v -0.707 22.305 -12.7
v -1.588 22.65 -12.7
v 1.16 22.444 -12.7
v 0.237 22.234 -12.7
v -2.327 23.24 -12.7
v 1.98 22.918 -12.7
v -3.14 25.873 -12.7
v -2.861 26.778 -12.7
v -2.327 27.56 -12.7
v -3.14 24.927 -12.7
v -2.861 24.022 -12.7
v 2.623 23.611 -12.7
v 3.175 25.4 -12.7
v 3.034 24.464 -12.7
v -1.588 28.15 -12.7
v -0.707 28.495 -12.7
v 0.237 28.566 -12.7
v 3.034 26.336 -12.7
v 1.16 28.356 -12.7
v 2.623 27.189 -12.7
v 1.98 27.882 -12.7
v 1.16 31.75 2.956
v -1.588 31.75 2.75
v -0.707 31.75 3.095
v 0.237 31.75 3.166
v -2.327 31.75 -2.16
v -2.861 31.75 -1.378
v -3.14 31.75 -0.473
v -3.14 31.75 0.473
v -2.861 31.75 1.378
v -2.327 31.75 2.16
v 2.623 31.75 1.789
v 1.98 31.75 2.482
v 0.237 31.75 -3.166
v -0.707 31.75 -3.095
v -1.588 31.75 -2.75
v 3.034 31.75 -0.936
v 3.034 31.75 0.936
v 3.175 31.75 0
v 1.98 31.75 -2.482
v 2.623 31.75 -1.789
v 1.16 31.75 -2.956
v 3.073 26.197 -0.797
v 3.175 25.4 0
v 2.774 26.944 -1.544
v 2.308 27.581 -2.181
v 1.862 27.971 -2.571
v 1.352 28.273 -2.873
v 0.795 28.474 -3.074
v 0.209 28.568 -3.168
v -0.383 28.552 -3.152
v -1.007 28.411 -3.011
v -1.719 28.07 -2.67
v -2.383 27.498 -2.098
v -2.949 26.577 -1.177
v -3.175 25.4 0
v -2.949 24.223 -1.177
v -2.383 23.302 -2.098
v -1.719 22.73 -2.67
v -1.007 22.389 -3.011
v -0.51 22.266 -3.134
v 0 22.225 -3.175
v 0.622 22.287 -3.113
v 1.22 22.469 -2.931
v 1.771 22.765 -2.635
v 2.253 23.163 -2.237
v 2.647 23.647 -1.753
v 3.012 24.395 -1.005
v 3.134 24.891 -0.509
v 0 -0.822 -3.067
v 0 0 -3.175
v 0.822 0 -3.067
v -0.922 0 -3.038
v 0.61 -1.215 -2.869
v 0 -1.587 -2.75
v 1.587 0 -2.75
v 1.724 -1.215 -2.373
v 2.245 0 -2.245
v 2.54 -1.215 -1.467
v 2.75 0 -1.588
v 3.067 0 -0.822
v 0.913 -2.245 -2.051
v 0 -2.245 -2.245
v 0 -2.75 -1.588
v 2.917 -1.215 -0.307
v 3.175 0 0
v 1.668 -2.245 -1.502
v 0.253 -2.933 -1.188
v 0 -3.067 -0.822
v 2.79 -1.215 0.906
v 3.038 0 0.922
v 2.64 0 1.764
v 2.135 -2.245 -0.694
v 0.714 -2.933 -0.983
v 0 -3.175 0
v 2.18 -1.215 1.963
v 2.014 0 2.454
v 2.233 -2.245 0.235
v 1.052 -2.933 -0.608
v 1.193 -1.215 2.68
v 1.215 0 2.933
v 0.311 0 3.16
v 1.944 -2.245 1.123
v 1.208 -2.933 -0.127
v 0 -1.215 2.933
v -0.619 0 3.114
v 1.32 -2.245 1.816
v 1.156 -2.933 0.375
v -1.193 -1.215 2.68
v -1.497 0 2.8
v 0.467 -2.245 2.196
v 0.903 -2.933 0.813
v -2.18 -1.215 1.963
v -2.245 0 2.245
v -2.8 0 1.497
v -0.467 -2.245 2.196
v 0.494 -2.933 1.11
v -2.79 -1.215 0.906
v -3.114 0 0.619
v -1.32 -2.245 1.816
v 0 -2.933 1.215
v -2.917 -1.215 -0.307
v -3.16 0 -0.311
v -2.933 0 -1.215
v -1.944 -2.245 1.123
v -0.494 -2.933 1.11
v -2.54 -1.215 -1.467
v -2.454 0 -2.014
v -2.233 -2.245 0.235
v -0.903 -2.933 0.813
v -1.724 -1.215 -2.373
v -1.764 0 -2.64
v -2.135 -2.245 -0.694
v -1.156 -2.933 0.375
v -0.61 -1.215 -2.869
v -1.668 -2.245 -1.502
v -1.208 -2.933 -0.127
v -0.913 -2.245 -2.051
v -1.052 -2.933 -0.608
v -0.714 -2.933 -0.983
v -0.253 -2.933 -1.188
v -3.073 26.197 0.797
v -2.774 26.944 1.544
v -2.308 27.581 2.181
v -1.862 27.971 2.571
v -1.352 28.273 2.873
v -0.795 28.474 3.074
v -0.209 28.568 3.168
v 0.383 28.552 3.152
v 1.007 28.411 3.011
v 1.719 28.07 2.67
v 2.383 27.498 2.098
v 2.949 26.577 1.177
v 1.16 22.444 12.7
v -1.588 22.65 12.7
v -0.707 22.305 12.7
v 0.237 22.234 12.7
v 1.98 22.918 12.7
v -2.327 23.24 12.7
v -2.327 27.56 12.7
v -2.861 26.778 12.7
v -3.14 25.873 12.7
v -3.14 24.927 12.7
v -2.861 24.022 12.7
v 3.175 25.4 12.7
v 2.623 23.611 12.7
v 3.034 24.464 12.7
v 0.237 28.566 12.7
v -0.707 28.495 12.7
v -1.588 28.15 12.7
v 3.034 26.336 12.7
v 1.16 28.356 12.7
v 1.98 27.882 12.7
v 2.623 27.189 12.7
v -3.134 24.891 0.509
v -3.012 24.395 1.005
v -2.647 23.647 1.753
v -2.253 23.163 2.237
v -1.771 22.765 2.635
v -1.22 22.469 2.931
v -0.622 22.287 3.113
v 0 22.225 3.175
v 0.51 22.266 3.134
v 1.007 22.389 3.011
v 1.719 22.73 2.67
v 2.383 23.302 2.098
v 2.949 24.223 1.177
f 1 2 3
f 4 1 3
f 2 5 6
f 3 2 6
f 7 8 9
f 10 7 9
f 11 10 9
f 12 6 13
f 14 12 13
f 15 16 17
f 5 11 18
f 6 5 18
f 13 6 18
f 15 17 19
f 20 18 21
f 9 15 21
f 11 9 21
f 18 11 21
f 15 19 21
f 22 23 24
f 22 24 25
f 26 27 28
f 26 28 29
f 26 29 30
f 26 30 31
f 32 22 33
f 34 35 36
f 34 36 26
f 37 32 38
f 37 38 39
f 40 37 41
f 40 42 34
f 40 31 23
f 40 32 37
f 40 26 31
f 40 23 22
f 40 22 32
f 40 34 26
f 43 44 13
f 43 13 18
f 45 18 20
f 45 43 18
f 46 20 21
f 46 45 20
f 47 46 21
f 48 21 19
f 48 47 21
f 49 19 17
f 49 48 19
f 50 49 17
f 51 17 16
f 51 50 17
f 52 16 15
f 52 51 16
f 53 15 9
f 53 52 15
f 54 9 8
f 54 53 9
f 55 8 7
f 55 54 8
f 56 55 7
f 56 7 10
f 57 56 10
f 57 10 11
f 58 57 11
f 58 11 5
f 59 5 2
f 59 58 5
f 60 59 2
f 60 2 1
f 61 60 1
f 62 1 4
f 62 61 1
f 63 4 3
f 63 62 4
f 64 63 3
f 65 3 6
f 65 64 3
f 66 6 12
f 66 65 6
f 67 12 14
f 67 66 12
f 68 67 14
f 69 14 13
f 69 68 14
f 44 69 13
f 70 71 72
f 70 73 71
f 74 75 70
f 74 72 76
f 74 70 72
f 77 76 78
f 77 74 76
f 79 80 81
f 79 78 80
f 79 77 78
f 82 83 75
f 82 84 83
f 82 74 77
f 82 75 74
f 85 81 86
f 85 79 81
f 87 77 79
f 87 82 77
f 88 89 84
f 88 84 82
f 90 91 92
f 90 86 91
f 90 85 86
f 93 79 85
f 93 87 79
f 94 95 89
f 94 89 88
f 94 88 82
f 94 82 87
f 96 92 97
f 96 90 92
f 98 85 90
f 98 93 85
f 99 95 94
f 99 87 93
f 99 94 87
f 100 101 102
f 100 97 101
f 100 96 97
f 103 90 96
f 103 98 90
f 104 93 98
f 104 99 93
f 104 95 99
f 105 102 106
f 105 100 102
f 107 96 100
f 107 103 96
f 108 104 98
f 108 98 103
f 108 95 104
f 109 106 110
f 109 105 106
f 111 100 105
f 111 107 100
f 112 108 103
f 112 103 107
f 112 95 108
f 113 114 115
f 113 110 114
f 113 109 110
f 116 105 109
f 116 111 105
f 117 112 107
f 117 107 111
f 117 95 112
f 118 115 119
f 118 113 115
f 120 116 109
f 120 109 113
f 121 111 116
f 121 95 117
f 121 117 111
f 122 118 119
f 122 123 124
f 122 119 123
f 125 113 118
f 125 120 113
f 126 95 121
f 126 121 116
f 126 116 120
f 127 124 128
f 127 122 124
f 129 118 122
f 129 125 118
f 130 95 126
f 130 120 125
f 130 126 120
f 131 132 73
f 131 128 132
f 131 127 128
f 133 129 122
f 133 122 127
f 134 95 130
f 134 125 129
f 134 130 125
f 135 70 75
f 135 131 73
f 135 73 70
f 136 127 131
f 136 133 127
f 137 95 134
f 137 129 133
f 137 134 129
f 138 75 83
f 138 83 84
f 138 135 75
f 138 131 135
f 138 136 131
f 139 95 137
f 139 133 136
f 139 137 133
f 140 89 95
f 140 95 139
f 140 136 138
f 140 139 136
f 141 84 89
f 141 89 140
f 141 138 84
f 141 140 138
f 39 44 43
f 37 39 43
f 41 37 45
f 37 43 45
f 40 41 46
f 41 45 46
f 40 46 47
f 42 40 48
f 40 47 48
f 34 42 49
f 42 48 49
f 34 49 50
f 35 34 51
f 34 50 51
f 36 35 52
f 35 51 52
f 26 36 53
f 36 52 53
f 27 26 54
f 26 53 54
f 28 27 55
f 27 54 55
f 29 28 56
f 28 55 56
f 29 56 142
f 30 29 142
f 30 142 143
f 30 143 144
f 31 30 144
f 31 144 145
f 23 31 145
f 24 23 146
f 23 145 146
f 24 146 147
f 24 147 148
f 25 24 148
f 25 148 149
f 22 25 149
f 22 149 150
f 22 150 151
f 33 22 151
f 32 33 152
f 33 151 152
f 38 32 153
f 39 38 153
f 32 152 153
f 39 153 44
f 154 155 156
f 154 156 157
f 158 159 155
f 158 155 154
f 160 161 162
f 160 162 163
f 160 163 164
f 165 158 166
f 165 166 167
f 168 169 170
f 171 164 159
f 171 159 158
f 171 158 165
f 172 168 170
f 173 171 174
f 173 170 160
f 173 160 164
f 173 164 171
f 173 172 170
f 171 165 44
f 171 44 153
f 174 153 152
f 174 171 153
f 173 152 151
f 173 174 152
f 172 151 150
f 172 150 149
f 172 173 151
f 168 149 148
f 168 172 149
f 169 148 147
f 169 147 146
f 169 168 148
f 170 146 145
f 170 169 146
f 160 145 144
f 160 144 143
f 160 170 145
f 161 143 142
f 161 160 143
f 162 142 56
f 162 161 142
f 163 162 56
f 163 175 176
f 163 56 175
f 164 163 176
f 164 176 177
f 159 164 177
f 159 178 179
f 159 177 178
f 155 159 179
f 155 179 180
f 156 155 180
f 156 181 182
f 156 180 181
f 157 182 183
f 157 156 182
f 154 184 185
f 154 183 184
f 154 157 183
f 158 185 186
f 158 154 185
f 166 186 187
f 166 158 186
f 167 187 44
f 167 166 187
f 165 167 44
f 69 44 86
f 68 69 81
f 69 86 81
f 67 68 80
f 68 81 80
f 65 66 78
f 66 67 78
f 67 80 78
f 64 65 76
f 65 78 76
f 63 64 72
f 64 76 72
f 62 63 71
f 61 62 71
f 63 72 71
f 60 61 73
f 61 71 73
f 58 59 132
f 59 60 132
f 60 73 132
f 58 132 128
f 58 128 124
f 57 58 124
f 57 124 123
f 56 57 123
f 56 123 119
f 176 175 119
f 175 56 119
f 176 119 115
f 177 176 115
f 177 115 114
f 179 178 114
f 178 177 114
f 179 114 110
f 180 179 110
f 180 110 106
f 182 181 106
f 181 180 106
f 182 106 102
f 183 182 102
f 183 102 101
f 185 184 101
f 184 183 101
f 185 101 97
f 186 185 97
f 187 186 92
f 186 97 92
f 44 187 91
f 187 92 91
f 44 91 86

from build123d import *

# Parameters (mm, degrees)
SKETCH1_R           = 3.175
BOSS_EXTRUDE1_DEPTH = 31.75
SKETCH2_R           = 3.175
BOSS_EXTRUDE2_DEPTH = 12.7
DOME2_FACE_RADIUS   = 3.175
DOME2_HEIGHT        = 3.175


with BuildPart() as part:
    # Sketch1 → Boss-Extrude1 (new body)
    with BuildSketch(Plane(origin=(0, 0, 0), x_dir=(1, 0, 0), z_dir=(0, 1, 0))):
        Circle(SKETCH1_R)
    extrude(amount=BOSS_EXTRUDE1_DEPTH)

    # Sketch2 → Boss-Extrude2 (add, symmetric)
    with BuildSketch(Plane.XY):
        with Locations((0, 25.4)):
            Circle(SKETCH2_R)
    extrude(amount=BOSS_EXTRUDE2_DEPTH, both=True)

    # Dome2: a dome of height H over a round flat face of radius A is a cap of a sphere of radius (A * A + H * H) / (2 * H)
    dome2_r = (DOME2_FACE_RADIUS * DOME2_FACE_RADIUS + DOME2_HEIGHT * DOME2_HEIGHT) / (2 * DOME2_HEIGHT)
    dome2_base = Plane((0, 0, 0), z_dir=(0, -1, 0))
    with Locations(dome2_base.offset(DOME2_HEIGHT - dome2_r)):
        dome2_ball = Sphere(dome2_r, mode=Mode.PRIVATE)
    add(split(dome2_ball, bisect_by=dome2_base, keep=Keep.TOP, mode=Mode.PRIVATE))


solid = part.part
